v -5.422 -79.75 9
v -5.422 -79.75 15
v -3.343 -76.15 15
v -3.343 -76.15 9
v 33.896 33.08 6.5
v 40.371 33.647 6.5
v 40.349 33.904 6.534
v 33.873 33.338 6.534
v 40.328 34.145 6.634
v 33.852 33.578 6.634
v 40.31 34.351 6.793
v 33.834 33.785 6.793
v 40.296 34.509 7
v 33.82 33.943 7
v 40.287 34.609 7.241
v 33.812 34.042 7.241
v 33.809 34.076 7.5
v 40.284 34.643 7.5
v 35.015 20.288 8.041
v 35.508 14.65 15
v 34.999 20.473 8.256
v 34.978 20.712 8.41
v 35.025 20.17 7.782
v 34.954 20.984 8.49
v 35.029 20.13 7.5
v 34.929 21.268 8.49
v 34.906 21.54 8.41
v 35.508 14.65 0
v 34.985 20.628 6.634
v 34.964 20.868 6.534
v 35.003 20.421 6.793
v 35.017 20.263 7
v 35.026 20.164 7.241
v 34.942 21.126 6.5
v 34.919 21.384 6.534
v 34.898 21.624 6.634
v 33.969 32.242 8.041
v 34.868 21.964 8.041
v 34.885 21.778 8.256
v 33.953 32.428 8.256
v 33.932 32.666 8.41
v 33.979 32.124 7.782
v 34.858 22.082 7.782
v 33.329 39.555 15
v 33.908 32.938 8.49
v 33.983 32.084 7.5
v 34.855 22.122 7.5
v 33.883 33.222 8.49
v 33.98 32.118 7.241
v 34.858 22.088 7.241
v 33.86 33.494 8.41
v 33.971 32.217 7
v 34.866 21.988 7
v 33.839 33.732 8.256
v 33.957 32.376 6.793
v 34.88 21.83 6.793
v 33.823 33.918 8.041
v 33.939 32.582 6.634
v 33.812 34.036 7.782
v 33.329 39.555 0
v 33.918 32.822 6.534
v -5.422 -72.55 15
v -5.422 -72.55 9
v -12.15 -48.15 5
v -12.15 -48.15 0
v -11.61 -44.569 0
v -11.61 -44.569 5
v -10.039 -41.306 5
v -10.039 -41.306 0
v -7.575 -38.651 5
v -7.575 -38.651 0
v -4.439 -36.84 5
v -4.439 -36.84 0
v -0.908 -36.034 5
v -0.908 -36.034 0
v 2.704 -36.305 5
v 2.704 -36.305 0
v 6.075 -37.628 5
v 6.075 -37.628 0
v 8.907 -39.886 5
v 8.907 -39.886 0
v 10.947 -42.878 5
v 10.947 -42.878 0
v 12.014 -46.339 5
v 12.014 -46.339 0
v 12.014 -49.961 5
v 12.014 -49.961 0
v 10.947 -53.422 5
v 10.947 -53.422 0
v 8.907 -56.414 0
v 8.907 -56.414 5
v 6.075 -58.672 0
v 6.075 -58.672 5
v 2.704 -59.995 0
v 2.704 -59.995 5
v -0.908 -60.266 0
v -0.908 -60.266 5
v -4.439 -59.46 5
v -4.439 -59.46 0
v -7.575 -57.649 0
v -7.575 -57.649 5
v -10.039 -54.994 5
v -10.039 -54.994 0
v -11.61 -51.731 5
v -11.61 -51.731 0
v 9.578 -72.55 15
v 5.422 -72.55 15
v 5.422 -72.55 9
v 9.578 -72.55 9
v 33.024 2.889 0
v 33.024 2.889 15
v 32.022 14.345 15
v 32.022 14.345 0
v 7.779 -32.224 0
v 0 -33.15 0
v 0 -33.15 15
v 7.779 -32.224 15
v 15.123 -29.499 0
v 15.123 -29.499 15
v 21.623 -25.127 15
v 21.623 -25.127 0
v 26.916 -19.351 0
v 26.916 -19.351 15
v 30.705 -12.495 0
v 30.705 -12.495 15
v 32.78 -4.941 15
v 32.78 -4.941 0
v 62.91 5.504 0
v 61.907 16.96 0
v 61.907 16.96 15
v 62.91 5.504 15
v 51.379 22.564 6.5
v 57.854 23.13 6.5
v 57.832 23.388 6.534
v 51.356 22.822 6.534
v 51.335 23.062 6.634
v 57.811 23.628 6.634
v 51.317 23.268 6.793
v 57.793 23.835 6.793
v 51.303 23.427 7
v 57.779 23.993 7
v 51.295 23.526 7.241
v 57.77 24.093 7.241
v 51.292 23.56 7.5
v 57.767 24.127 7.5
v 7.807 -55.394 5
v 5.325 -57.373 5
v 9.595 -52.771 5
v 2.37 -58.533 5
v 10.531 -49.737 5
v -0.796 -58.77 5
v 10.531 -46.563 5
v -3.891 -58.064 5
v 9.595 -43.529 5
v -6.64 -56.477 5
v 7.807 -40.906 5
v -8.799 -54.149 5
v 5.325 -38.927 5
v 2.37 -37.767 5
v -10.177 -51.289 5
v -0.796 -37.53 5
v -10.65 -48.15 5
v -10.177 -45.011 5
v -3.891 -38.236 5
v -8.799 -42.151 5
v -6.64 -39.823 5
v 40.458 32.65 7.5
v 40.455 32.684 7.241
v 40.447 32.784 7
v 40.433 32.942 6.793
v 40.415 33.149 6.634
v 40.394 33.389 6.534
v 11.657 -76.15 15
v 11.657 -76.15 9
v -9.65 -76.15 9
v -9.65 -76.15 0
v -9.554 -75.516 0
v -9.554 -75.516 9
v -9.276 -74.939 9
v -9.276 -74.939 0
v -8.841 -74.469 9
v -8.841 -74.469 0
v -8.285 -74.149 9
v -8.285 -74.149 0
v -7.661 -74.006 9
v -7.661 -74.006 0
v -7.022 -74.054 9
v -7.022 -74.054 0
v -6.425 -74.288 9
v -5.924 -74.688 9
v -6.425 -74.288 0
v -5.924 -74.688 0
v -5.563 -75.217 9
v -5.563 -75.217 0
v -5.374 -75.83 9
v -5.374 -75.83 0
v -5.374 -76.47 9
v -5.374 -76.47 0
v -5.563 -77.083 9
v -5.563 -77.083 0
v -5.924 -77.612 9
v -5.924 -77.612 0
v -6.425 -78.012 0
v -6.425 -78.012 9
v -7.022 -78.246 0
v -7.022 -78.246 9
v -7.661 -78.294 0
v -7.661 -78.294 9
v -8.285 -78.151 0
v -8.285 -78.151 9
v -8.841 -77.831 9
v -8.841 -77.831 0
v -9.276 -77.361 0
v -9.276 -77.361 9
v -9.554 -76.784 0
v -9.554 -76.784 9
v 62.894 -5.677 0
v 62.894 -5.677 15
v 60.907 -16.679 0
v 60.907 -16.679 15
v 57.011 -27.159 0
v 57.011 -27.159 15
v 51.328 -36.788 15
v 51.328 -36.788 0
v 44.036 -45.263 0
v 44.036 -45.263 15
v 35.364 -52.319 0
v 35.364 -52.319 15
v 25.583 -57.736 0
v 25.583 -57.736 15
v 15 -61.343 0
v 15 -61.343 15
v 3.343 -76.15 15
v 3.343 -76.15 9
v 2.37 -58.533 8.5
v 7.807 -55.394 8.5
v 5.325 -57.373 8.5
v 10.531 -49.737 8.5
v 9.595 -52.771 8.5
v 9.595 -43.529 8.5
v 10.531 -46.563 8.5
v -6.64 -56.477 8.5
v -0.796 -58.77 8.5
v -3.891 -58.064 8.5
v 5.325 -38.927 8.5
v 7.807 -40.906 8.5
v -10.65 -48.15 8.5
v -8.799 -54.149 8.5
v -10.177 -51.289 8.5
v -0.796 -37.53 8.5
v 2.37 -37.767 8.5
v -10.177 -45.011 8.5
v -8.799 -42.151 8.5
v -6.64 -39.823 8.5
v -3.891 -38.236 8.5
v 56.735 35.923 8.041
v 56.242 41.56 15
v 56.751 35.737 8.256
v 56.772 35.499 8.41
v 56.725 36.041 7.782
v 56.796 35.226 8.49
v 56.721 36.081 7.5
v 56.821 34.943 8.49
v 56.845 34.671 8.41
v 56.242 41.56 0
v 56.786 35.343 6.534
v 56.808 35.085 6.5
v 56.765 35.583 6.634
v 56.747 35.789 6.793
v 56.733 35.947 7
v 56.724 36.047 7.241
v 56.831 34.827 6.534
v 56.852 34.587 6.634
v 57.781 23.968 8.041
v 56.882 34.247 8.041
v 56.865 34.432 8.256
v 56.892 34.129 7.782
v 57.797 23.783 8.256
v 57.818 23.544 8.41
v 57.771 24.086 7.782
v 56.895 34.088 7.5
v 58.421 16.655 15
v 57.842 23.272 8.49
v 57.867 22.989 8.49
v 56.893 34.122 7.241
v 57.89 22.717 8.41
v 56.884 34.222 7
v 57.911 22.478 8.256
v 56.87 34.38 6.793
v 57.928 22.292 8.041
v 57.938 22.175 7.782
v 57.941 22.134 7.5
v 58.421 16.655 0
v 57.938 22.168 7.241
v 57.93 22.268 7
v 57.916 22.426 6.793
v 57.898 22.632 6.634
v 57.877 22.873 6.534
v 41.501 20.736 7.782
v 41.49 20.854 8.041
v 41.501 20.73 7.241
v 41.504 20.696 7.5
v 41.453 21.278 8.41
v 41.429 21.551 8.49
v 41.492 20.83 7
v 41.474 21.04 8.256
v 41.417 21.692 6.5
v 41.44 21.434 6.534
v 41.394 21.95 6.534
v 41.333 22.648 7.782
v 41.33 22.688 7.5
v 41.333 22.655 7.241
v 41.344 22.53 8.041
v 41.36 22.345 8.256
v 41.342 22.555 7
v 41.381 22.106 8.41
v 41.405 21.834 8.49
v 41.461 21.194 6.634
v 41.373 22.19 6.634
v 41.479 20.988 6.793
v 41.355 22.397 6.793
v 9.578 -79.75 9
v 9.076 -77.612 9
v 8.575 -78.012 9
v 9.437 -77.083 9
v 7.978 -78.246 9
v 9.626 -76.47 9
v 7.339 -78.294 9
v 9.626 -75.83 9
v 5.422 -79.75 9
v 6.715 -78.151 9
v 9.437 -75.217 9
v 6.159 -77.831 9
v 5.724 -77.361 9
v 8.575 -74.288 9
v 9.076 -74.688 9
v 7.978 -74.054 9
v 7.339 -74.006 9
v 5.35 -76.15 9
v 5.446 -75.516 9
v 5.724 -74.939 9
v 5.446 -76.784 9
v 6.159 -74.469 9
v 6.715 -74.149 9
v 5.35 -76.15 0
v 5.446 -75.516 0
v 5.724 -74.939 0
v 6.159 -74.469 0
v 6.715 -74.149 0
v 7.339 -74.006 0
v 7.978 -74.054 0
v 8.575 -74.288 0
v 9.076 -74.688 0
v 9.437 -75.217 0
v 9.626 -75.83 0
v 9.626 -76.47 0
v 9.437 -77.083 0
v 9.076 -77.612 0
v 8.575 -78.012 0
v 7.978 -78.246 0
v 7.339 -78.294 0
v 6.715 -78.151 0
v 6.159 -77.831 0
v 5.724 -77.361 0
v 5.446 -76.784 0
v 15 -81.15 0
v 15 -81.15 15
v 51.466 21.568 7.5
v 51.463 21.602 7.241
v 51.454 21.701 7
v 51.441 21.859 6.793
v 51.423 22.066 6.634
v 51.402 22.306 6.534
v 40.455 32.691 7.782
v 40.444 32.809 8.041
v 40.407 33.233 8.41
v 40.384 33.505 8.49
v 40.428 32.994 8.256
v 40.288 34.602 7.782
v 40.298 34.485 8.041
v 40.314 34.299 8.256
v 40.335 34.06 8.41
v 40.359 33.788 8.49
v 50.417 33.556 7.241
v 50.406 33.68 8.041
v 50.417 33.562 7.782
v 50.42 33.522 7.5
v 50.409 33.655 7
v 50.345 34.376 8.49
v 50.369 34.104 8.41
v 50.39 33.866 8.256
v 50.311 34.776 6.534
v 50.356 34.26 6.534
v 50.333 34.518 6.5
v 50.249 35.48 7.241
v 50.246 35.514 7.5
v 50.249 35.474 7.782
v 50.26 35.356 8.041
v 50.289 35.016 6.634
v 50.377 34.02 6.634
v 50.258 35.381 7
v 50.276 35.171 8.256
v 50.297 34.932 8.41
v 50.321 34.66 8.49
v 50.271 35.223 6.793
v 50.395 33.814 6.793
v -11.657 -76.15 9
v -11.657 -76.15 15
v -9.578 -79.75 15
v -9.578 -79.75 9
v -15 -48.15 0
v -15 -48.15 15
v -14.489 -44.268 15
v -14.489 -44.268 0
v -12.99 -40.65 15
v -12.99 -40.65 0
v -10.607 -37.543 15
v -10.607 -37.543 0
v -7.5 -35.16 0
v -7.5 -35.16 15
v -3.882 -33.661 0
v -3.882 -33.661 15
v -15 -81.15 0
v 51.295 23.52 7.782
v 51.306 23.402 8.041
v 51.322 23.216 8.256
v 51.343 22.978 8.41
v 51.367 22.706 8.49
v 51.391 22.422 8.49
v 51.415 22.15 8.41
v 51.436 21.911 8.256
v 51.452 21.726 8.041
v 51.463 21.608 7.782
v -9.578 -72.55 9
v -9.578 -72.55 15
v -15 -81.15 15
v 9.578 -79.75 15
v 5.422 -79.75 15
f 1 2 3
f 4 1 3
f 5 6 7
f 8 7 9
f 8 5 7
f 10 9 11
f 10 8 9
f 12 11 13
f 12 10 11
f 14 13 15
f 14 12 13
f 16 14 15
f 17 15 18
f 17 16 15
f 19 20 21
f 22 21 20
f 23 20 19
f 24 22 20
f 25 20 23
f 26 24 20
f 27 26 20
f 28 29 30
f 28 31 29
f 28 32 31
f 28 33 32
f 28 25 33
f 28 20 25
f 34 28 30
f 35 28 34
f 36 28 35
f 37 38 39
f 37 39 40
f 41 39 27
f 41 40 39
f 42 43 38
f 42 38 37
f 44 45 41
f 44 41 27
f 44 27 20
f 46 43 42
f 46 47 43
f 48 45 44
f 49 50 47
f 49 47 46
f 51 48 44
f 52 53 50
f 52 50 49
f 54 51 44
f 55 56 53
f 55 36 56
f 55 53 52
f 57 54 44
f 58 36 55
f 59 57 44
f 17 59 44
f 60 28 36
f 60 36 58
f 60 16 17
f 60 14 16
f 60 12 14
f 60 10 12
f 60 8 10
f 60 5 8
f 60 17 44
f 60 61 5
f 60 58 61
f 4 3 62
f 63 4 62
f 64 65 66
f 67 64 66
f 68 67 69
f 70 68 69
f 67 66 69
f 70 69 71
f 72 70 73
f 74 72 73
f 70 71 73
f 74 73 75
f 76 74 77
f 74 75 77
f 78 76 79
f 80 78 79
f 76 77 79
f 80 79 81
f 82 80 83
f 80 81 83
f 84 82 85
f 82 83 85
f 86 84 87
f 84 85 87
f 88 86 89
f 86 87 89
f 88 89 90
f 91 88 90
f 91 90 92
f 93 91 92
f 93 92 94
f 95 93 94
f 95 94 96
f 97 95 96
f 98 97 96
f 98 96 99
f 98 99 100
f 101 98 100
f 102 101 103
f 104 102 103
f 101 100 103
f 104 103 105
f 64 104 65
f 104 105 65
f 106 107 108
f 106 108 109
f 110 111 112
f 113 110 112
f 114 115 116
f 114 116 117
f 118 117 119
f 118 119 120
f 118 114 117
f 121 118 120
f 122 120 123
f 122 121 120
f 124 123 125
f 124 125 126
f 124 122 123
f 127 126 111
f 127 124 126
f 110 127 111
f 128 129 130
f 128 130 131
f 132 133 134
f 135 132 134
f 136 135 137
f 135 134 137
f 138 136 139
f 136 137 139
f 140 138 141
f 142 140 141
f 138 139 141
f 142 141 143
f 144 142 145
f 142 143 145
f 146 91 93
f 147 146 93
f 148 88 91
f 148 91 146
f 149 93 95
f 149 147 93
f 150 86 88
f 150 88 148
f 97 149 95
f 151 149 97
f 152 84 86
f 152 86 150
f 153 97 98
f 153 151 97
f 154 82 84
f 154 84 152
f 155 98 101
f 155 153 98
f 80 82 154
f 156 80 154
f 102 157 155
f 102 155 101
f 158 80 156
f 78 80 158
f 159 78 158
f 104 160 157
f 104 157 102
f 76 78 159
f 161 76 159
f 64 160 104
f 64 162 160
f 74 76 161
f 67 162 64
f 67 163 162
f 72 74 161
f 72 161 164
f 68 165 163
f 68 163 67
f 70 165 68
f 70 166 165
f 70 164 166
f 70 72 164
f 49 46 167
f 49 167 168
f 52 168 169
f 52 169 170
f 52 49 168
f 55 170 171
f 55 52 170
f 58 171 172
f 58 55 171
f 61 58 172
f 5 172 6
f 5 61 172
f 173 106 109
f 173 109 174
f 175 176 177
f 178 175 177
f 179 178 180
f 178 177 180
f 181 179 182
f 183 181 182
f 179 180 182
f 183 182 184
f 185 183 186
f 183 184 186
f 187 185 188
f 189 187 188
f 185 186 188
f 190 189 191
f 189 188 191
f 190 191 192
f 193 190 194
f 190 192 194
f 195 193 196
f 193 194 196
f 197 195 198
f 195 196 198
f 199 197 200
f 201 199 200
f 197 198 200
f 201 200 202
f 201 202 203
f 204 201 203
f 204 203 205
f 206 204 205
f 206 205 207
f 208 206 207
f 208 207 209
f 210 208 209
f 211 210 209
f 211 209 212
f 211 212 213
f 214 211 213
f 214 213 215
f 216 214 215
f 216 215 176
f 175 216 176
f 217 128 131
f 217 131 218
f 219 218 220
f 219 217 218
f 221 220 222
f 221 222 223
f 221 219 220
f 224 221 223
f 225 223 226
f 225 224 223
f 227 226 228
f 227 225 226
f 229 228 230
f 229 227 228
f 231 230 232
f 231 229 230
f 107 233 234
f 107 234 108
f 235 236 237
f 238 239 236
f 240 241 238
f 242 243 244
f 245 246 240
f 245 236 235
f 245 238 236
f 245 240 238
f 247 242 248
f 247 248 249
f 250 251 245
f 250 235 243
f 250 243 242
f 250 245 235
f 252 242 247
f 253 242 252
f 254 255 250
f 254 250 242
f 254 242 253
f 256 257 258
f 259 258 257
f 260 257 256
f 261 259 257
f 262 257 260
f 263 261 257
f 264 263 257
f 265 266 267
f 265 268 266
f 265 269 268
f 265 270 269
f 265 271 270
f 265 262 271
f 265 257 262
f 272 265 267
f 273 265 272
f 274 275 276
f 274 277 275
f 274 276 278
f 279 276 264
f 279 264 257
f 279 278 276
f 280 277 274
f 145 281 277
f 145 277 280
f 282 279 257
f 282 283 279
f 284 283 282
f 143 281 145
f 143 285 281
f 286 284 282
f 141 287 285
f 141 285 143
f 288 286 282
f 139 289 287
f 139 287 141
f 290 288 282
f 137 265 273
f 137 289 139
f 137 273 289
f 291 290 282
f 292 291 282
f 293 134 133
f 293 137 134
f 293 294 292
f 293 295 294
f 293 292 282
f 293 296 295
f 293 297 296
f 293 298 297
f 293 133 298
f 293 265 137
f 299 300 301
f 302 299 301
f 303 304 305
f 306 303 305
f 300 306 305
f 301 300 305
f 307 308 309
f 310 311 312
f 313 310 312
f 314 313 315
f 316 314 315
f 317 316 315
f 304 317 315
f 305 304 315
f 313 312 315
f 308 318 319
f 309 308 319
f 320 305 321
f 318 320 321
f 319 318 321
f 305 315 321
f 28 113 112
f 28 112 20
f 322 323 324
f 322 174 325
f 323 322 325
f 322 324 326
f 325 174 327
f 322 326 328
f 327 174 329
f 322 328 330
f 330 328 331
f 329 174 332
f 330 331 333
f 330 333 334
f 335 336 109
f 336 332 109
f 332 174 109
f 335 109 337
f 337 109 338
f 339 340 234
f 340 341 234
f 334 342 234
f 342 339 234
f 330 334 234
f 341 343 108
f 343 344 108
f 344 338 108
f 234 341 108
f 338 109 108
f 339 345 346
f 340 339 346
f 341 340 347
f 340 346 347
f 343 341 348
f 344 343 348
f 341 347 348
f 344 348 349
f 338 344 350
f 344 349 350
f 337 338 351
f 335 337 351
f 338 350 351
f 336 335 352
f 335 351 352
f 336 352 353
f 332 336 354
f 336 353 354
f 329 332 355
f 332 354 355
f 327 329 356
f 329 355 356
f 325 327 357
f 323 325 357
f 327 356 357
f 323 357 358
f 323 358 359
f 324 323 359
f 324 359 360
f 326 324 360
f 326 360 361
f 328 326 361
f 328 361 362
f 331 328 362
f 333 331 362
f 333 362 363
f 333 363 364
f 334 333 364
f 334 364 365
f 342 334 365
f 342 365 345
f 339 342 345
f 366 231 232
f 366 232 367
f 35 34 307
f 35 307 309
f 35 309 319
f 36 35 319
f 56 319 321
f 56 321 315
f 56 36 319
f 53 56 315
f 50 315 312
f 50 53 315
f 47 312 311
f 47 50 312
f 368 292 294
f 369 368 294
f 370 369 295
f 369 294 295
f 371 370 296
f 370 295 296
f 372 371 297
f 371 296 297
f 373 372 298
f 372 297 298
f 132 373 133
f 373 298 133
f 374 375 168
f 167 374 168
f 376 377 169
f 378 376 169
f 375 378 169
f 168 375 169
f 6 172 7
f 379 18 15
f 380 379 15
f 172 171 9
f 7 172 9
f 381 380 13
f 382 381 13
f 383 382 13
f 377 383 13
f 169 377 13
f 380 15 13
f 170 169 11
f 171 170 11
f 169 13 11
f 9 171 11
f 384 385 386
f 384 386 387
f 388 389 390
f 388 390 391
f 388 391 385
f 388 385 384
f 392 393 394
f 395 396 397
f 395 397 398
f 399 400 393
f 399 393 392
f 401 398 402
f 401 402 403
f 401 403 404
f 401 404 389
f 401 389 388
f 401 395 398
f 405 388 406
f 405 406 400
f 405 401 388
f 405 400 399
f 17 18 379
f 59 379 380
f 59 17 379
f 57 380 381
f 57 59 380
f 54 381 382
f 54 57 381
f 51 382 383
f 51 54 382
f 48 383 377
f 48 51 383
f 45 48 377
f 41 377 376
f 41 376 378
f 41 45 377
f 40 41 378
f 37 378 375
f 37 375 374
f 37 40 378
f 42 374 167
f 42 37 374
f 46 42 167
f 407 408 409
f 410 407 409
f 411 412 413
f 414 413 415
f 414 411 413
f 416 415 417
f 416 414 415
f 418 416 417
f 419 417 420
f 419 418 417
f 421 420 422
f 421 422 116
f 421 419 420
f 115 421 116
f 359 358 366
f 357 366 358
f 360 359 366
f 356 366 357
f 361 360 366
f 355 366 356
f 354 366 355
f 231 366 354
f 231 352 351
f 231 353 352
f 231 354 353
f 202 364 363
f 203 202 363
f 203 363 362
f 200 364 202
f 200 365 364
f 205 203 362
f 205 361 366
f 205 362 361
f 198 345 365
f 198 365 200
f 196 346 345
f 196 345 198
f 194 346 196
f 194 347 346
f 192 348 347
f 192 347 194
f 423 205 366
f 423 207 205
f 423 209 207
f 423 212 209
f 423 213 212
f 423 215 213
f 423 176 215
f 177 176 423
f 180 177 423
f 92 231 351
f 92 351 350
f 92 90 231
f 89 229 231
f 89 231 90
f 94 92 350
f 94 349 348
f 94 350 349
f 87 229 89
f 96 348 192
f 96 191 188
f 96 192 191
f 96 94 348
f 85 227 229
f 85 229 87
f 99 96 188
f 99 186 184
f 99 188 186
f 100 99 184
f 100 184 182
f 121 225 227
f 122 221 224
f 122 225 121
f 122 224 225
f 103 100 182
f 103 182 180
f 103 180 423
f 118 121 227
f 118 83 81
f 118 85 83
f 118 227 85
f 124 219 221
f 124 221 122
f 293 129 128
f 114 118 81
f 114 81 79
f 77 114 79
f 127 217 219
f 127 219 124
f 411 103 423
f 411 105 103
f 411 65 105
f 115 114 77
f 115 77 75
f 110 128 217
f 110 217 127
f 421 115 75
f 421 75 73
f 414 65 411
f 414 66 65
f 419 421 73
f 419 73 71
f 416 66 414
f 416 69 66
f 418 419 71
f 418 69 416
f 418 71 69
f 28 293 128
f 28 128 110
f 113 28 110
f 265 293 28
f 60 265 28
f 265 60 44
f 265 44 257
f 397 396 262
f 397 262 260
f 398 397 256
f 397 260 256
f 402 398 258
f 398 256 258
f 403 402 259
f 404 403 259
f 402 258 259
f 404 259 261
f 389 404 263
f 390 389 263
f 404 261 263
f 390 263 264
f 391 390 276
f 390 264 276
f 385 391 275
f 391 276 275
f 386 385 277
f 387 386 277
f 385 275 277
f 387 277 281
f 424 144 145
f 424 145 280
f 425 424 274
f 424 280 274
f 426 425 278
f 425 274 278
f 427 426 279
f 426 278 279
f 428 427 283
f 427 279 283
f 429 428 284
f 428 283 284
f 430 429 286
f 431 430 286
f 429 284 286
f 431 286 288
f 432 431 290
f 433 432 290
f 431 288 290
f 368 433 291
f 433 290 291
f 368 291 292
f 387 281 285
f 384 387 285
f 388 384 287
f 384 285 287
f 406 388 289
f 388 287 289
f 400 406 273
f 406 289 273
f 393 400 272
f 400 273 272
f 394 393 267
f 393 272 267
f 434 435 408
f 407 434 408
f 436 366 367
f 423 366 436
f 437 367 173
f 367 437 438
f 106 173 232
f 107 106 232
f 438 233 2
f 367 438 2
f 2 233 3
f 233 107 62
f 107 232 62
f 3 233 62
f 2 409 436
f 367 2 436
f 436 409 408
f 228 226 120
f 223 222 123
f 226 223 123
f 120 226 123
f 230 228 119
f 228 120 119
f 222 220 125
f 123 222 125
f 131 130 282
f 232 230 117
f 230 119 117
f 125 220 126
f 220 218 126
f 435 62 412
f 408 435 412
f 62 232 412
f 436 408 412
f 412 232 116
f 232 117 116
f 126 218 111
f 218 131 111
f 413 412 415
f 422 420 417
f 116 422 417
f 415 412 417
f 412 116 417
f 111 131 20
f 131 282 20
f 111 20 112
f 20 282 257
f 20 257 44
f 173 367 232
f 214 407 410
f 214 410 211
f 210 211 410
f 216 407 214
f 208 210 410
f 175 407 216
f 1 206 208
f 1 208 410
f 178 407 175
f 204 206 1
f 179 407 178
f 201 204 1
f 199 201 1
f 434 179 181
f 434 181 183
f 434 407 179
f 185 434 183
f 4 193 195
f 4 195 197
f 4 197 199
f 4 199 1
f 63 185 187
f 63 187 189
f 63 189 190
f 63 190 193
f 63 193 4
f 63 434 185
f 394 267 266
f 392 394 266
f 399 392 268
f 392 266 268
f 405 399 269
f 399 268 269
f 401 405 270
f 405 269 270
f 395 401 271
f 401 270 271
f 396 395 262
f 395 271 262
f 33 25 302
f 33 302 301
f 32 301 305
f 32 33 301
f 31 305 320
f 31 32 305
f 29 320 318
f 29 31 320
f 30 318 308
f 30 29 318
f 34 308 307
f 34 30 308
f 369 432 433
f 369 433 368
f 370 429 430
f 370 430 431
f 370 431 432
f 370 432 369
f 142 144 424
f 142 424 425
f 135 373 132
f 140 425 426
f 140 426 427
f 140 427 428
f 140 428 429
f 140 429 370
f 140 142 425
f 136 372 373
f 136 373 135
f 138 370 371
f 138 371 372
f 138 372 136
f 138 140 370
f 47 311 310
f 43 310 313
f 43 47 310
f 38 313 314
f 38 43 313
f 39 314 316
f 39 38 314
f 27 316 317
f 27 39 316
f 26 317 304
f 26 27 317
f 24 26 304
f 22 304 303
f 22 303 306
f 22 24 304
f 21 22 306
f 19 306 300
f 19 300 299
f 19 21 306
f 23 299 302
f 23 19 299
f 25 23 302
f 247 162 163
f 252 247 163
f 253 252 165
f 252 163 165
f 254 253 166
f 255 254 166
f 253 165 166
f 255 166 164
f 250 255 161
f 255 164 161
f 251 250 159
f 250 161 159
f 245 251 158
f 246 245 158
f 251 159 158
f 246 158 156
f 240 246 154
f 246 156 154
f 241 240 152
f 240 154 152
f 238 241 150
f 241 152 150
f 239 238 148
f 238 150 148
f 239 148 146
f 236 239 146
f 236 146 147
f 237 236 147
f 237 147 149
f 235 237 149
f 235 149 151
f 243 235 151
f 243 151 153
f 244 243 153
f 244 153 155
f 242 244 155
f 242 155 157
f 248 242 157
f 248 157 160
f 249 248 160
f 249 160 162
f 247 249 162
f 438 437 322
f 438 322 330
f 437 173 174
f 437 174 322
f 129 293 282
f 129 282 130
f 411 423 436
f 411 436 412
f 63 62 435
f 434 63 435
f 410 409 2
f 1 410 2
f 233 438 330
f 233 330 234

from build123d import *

# Parameters (mm, degrees)
SKETCH_395_R           = 7.6
EXTRUDE_923_DEPTH      = 15
CUT_EXTRUDE_1359_DEPTH = 10
SKETCH_4236_W          = 30
SKETCH_4236_H          = 12
SKETCH_4236_R          = 2.15
SKETCH_4236_R_2        = 4.1
EXTRUDE_5757_DEPTH     = 15
SKETCH_1_3_R           = 12.15
SKETCH_1_3_R_2         = 10.65
CUT_EXTRUDE_5889_DEPTH = 5
SKETCH_1_4_R           = 10.65
CUT_EXTRUDE_5977_DEPTH = 8.5
CUT_EXTRUDE_7570_DEPTH = 6
SKETCH_1_R             = 7.65
EXTRUDE_7865_DEPTH     = 6.5


with BuildPart() as part:
    # Sketch 395 → Extrude 923 (new body)
    with BuildSketch(Plane.XY):
        with BuildLine():
            Line((33.023854242, 2.889212872), (32.0215632, 14.3454519))
            Line((32.0215632, 14.3454519), (35.508244643, 14.650497))
            Line((35.508244643, 14.650497), (33.329351075, 39.555364452))
            Line((33.329351075, 39.555364452), (56.241829131, 41.559946535))
            Line((56.241829131, 41.559946535), (58.4207227, 16.655079083))
            Line((58.4207227, 16.655079083), (61.907404143, 16.960124183))
            Line((61.907404143, 16.960124183), (62.909695184, 5.503885155))
            ThreePointArc((62.909695184, 5.503885155), (46.55906382, -42.663521611), (0, -63.15))
            ThreePointArc((0, -63.15), (-15, -48.15), (0, -33.15))
            ThreePointArc((0, -33.15), (24.440743715, -22.395815382), (33.023854242, 2.889212872))
        make_face()
        with Locations((0, -48.15)):
            Circle(SKETCH_395_R, mode=Mode.SUBTRACT)
    extrude(amount=EXTRUDE_923_DEPTH)

    # Sketch 978 → Cut-Extrude 1359 (cut)
    with BuildSketch(Plane(origin=(62.909695184, 5.503885155, 0), x_dir=(0, 0, -1), z_dir=(0.9961946980917458, 0.08715574274765542, 0))):
        with BuildLine():
            ThreePointArc((-6.5, 30), (-6.792893219, 30.707106781), (-7.5, 31))
            Line((-7.5, 31), (-7.5, 29))
            ThreePointArc((-7.5, 29), (-6.792893219, 29.292893219), (-6.5, 30))
        make_face()
        with BuildLine():
            Line((-7.5, 29), (-7.5, 31))
            ThreePointArc((-7.5, 31), (-8.5, 30), (-7.5, 29))
        make_face()
        with BuildLine():
            ThreePointArc((-6.5, 18), (-6.792893219, 18.707106781), (-7.5, 19))
            Line((-7.5, 19), (-7.5, 17))
            ThreePointArc((-7.5, 17), (-6.792893219, 17.292893219), (-6.5, 18))
        make_face()
        with BuildLine():
            Line((-7.5, 17), (-7.5, 19))
            ThreePointArc((-7.5, 19), (-8.5, 18), (-7.5, 17))
        make_face()
    cut_extrude_1359 = extrude(amount=-CUT_EXTRUDE_1359_DEPTH, mode=Mode.SUBTRACT)

    # Mirror 1435: Cut-Extrude 1359 across plane
    add(cut_extrude_1359.mirror(Plane(origin=(47.966774713, 4.196549013, 0), x_dir=(0, 0, 1), z_dir=(0.9961946980917455, 0.0871557427476578, 0))), mode=Mode.SUBTRACT)

    # Sketch 4236 → Extrude 5757 (add)
    # profile 1 of 5: a face of its own
    with BuildSketch(Plane(origin=(0, 0, 0), x_dir=(-1, 0, 0), z_dir=(0, 0, -1))):
        with BuildLine():
            ThreePointArc((0, -63.15), (-7.554244854, -62.69653806), (-15, -61.342664598))
            Line((-15, -61.342664598), (-15, -69.15))
            Line((-15, -69.15), (15, -69.15))
            Line((15, -69.15), (15, -48.15))
            ThreePointArc((15, -48.15), (10.606601718, -58.756601718), (0, -63.15))
        make_face()
    # profile 2 of 5: a face of its own
    with BuildSketch(Plane(origin=(0, 0, 0), x_dir=(-1, 0, 0), z_dir=(0, 0, -1))):
        with Locations((0, -75.15)):
            Rectangle(SKETCH_4236_W, SKETCH_4236_H)
        Polygon((-9.578460969, -72.55), (-5.421539031, -72.55), (-3.343078062, -76.15), (-5.421539031, -79.75), (-9.578460969, -79.75), (-11.656921938, -76.15), align=None, mode=Mode.SUBTRACT)
        Polygon((5.421539031, -79.75), (3.343078062, -76.15), (5.421539031, -72.55), (9.578460969, -72.55), (11.656921938, -76.15), (9.578460969, -79.75), align=None, mode=Mode.SUBTRACT)
    # profile 3 of 5: a face of its own
    with BuildSketch(Plane(origin=(0, 0, 0), x_dir=(-1, 0, 0), z_dir=(0, 0, -1))):
        Polygon((-5.421539031, -79.75), (-3.343078062, -76.15), (-5.421539031, -72.55), (-9.578460969, -72.55), (-11.656921938, -76.15), (-9.578460969, -79.75), align=None)
        with Locations((-7.5, -76.15)):
            Circle(SKETCH_4236_R, mode=Mode.SUBTRACT)
    # profile 4 of 5: a face of its own
    with BuildSketch(Plane(origin=(0, 0, 0), x_dir=(-1, 0, 0), z_dir=(0, 0, -1))):
        Polygon((5.421539031, -72.55), (9.578460969, -72.55), (11.656921938, -76.15), (9.578460969, -79.75), (5.421539031, -79.75), (3.343078062, -76.15), align=None)
        with Locations((7.5, -76.15)):
            Circle(SKETCH_4236_R, mode=Mode.SUBTRACT)
    # profile 5 of 5: a face of its own
    with BuildSketch(Plane(origin=(0, 0, 0), x_dir=(-1, 0, 0), z_dir=(0, 0, -1))):
        with Locations((0, -48.15)):
            Circle(SKETCH_4236_R_2)
    extrude(amount=-EXTRUDE_5757_DEPTH)


with BuildPart() as extrude_5757_kept_piece:
    # of the separate pieces the step leaves, the one the design keeps (extrude_5757_pieces_kept)
    add(part.part.solids().sort_by_distance((0, -33.15, 0))[0])

    # Эскиз1_3 → Cut-Extrude 5889 (cut)
    with BuildSketch(Plane(origin=(0, 0, 0), x_dir=(-1, 0, 0), z_dir=(0, 0, -1))):
        with Locations((0, -48.15)):
            Circle(SKETCH_1_3_R)
        with Locations((0, -48.15)):
            Circle(SKETCH_1_3_R_2, mode=Mode.SUBTRACT)
    extrude(amount=-CUT_EXTRUDE_5889_DEPTH, mode=Mode.SUBTRACT)

    # Эскиз1<4> → Cut-Extrude 5977 (cut)
    with BuildSketch(Plane(origin=(0, 0, 0), x_dir=(-1, 0, 0), z_dir=(0, 0, -1))):
        with Locations((0, -48.15)):
            Circle(SKETCH_1_4_R)
    extrude(amount=-CUT_EXTRUDE_5977_DEPTH, mode=Mode.SUBTRACT)

    # Sketch 6737 → Cut-Extrude 7570 (cut)
    with BuildSketch(Plane.XY.offset(15)):
        Polygon((5.421539031, -79.75), (3.343078062, -76.15), (5.421539031, -72.55), (9.578460969, -72.55), (11.656921938, -76.15), (9.578460969, -79.75), align=None)
        Polygon((-3.343078062, -76.15), (-5.421539031, -72.55), (-9.578460969, -72.55), (-11.656921938, -76.15), (-9.578460969, -79.75), (-5.421539031, -79.75), align=None)
    extrude(amount=-CUT_EXTRUDE_7570_DEPTH, mode=Mode.SUBTRACT)

    # Эскиз1 → Extrude 7865 (add)
    with BuildSketch(Plane(origin=(0, 0, 8.5), x_dir=(-1, 0, 0), z_dir=(0, 0, -1))):
        with Locations((0, -48.15)):
            Circle(SKETCH_1_R)
    extrude(amount=-EXTRUDE_7865_DEPTH)


solid = extrude_5757_kept_piece.part
